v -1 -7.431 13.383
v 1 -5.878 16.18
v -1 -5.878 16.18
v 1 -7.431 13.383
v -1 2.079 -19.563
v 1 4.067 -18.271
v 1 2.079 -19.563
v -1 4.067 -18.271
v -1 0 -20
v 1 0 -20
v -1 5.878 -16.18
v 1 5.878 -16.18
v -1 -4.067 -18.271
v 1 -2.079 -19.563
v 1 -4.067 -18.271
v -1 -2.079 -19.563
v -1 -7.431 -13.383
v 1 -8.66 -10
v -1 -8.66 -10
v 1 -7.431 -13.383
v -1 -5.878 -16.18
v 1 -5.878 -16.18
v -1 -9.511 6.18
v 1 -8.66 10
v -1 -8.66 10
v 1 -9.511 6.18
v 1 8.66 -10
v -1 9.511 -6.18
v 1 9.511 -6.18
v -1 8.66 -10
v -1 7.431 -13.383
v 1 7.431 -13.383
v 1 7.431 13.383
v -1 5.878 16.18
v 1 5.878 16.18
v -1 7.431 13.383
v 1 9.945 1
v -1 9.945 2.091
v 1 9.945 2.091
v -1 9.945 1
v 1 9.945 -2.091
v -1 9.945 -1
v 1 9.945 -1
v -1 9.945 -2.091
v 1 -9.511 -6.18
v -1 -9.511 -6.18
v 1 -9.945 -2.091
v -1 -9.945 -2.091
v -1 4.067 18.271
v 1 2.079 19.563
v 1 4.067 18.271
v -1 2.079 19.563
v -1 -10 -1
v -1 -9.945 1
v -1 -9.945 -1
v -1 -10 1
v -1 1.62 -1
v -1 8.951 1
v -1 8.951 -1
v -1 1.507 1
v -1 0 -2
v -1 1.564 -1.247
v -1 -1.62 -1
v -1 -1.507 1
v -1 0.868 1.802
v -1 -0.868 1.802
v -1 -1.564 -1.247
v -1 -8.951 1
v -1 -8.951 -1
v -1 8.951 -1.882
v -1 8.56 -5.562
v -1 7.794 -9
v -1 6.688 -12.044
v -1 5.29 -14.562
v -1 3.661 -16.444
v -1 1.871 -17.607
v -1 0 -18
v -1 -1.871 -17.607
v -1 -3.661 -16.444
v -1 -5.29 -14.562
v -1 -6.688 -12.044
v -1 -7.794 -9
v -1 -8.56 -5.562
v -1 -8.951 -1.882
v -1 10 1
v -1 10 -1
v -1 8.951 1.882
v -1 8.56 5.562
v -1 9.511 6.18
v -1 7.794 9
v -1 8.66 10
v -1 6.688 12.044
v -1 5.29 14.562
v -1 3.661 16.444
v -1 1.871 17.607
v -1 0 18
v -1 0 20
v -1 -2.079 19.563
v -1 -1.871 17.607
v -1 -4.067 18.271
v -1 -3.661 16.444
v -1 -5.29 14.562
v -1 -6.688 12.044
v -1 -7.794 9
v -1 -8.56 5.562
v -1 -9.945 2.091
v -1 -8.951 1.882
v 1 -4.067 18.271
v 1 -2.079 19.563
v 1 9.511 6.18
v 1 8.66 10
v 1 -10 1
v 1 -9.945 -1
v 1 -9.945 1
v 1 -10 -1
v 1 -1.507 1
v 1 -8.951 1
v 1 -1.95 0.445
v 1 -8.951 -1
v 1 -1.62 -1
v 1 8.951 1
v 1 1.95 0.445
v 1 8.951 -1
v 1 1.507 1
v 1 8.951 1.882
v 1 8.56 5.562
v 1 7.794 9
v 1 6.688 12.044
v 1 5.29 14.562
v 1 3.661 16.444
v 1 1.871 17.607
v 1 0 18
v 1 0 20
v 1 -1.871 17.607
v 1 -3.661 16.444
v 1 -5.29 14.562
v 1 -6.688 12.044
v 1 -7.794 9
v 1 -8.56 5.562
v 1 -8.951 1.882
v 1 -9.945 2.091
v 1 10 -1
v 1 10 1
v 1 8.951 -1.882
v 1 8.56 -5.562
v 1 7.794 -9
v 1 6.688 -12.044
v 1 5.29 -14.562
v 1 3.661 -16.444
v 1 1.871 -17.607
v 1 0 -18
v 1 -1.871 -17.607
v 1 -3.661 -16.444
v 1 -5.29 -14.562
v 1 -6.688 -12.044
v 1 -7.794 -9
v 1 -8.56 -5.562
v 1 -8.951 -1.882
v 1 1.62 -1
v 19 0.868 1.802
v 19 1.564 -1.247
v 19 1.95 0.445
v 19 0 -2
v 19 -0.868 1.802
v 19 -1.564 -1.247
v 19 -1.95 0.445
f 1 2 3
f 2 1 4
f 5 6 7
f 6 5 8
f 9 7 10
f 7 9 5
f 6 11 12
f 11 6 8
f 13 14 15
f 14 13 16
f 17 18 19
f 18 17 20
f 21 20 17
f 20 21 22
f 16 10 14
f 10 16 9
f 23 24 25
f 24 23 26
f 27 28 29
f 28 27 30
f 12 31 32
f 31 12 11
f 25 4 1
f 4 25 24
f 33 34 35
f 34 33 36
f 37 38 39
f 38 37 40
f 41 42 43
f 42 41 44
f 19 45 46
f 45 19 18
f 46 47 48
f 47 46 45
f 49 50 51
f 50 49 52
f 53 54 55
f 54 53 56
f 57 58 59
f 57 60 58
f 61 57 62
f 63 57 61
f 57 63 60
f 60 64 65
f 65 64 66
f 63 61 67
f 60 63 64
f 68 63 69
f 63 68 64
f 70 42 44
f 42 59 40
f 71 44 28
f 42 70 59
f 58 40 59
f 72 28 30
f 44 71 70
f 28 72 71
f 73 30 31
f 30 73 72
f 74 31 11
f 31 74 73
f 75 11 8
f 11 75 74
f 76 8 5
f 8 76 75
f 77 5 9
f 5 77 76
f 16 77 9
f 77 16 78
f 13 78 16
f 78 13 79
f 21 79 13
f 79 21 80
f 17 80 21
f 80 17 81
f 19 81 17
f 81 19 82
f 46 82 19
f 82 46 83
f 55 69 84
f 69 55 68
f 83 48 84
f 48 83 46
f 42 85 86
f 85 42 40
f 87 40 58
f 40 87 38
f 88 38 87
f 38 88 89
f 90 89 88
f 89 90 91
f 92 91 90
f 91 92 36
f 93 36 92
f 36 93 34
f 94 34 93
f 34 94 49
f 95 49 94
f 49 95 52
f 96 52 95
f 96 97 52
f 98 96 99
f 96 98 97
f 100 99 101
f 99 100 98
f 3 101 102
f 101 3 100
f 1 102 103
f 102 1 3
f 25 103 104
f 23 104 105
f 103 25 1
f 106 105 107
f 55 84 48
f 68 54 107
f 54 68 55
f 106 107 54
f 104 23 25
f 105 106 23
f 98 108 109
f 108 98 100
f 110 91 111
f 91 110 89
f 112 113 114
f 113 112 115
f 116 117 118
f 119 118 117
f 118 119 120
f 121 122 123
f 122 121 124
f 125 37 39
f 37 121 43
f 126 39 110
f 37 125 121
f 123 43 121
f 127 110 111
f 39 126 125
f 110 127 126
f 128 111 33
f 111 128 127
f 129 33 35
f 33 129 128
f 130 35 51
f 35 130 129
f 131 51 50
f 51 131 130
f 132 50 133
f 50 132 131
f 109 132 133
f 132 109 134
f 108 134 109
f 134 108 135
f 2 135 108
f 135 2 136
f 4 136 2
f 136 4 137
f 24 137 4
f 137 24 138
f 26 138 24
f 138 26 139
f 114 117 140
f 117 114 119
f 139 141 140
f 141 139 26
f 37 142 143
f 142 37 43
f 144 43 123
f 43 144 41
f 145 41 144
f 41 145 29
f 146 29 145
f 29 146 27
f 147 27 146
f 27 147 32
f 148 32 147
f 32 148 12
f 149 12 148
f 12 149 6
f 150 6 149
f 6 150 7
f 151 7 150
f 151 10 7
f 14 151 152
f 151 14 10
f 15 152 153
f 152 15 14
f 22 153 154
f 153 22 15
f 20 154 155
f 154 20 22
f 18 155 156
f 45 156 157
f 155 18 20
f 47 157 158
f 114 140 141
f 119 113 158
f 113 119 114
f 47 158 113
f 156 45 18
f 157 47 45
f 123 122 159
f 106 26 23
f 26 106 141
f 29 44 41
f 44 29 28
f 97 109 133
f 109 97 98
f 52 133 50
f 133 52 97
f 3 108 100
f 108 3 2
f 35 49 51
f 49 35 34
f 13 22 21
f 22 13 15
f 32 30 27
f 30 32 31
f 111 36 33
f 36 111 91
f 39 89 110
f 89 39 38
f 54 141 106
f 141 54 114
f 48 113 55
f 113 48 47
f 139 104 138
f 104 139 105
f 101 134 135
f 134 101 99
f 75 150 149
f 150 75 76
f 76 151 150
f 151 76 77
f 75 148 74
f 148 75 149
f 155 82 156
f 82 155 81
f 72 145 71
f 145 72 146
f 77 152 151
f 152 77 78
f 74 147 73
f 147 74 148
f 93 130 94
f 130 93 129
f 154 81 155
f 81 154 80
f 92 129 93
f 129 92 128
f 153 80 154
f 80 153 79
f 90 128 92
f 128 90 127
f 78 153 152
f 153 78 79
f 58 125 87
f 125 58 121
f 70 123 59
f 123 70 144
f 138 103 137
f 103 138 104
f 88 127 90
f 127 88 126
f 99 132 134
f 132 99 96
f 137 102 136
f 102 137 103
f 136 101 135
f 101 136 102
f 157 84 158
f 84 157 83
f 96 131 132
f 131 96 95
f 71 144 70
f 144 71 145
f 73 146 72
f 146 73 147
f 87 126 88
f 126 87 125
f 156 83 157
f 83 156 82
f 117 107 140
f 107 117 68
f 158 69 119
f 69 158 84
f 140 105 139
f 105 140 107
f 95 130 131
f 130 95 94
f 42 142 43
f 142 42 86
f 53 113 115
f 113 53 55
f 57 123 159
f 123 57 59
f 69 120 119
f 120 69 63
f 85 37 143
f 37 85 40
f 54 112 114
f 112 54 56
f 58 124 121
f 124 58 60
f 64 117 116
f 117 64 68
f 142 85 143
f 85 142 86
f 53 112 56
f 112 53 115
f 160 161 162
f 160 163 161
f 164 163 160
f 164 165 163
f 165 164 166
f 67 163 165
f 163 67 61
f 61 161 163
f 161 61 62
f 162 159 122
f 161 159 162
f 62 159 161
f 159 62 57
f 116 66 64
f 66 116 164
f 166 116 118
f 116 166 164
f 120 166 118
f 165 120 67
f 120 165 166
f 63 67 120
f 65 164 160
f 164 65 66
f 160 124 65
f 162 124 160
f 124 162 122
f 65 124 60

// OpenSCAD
radius = 20; 
thickness = 2;

rotate([0,90,0])
 scale([1,0.5,1])
  union(){
      difference() {
        cylinder(thickness, radius, radius, true);
        cylinder(3, radius-thickness, radius-thickness, true);
      }
      //translate([-radius,-1,-1])
        //cube([radius*2, thickness, thickness]);
    translate([-1,-radius,-1])
      cube([thickness, radius*2, thickness]);
  }
 
rotate([0,90,0])
 translate([0,0,-1])
  cylinder(20, 2, 2);
